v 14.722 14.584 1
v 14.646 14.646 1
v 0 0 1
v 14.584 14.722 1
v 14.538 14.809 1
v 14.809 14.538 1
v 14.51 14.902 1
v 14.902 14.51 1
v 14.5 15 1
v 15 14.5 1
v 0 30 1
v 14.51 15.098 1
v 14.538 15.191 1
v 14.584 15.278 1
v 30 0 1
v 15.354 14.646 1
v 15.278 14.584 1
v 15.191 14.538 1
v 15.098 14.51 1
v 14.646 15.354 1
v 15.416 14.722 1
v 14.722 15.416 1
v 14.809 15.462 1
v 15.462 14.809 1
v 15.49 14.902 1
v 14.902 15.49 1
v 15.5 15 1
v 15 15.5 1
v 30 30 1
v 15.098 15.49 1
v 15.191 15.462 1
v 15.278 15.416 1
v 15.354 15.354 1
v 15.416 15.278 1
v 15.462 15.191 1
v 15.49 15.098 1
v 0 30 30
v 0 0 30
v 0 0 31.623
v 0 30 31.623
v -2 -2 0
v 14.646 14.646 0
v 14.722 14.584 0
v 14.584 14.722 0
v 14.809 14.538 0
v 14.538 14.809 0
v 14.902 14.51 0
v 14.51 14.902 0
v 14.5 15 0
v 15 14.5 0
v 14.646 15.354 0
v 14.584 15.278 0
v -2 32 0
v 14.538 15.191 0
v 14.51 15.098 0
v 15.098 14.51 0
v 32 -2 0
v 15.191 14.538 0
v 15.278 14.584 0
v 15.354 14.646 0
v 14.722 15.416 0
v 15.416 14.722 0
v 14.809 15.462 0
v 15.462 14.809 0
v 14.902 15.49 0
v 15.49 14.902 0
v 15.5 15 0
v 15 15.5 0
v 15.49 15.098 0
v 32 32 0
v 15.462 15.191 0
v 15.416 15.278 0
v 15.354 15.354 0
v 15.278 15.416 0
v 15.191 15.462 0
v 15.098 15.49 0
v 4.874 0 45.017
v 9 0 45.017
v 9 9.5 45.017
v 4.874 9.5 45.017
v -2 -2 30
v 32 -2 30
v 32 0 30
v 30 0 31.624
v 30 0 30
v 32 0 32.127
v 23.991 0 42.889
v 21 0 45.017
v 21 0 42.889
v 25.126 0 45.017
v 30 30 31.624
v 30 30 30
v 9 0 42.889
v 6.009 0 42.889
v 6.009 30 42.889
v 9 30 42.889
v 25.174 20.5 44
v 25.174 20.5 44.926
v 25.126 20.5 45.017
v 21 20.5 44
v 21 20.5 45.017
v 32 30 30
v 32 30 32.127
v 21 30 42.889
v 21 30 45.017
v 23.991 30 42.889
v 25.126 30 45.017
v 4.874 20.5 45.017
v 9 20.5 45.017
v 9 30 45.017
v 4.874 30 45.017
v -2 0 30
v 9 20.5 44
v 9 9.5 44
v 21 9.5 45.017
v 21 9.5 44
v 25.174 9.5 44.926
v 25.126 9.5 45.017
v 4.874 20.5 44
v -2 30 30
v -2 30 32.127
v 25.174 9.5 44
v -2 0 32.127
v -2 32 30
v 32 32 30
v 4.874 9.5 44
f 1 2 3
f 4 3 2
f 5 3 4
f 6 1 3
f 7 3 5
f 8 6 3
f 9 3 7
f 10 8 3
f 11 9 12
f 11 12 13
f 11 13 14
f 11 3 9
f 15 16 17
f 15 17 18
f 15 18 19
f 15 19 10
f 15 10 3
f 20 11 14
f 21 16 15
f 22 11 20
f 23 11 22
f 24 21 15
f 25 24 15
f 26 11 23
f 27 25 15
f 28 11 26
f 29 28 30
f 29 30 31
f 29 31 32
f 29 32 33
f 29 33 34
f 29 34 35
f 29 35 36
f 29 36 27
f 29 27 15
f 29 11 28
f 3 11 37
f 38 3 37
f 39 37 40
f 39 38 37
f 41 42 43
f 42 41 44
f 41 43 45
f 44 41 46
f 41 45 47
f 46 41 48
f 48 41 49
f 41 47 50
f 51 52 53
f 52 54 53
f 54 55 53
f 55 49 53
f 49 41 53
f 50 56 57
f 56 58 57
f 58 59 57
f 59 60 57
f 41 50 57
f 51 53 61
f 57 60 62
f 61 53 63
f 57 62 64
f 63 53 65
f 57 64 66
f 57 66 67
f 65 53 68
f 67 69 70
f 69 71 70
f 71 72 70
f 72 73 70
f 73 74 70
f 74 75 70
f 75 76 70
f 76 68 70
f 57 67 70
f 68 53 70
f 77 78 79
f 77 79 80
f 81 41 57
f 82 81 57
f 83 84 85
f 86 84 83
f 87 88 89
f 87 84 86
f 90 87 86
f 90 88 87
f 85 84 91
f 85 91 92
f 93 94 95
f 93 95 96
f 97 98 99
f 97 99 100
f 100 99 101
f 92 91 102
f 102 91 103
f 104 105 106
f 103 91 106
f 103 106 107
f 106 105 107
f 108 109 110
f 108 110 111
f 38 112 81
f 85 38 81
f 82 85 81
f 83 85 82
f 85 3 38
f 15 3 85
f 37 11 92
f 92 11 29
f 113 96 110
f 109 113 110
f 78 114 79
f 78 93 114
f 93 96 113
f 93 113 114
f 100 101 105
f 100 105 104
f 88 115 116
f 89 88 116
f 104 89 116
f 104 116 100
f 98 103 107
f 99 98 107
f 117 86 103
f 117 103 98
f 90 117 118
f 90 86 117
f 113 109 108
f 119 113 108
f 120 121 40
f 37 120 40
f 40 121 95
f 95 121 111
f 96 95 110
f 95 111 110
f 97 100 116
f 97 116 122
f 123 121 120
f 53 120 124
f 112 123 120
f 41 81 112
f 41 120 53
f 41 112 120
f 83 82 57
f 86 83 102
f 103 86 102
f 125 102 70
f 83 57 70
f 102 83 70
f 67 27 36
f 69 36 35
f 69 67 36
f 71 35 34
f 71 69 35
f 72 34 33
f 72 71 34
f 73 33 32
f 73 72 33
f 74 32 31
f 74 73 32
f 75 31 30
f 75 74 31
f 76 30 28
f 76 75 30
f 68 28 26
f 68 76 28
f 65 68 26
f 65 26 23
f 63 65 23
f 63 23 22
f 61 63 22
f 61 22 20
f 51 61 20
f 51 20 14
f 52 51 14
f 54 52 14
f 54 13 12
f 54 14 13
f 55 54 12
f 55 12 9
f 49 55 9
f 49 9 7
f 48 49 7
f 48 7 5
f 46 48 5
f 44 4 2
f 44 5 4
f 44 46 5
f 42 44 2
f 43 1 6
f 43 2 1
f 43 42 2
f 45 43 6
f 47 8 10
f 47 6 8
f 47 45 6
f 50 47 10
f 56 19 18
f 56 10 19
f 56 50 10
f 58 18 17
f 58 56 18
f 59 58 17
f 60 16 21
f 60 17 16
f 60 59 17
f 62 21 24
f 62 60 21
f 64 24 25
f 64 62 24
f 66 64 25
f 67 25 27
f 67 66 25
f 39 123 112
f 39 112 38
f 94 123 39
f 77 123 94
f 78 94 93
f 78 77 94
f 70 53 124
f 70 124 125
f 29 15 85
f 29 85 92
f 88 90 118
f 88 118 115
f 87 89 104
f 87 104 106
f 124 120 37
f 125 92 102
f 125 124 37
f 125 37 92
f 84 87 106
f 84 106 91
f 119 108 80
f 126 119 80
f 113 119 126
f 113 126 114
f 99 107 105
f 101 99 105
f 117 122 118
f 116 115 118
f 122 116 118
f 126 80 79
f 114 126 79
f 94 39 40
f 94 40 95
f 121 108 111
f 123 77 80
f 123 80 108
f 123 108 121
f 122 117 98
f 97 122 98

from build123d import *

# Parameters (mm, degrees)
F0_W      = 34
F0_H      = 34
F0_W_2    = 30
F0_H_2    = 30
F1_DEPTH  = 30
F2_W      = 32.414368
F2_H      = 32.092232
F3_DEPTH  = 1
F4_R      = 0.5
F5_DEPTH  = 2
F7_DEPTH  = 30
F10_DEPTH = 2


with BuildPart() as f1:
    # F0 (on Top) → F1 (new body)
    with BuildSketch(Plane.XY):
        with Locations((15, 15)):
            Rectangle(F0_W, F0_H)
        with Locations((15, 15)):
            Rectangle(F0_W_2, F0_H_2, mode=Mode.SUBTRACT)
    extrude(amount=F1_DEPTH)

    # F2 (on Top) → F3 (join)
    with BuildSketch(Plane.XY):
        with Locations((15.036923, 14.937822)):
            Rectangle(F2_W, F2_H)
    extrude(amount=F3_DEPTH)

    # F4 (on Top) → F5 (cut)
    with BuildSketch(Plane.XY):
        with Locations((15, 15)):
            Circle(F4_R)
    extrude(amount=F5_DEPTH, mode=Mode.SUBTRACT)

    # F6 (on Front) → F7 (join)
    with BuildSketch(Plane.XZ):
        Polygon((-2, 32.127354), (-2, 30), (-0.865411, 30), (0, 30), (0, 31.622646), (6.008863, 42.889264), (7.5, 42.889264), (9, 42.889264), (9, 45.016619), (7.5, 45.016619), (6.008863, 45.016619), (4.874274, 45.016619), align=None)
        Polygon((32, 32.127354), (25.125726, 45.016619), (23.991137, 45.016619), (22.5, 45.016619), (21, 45.016619), (21, 42.889264), (22.5, 42.889264), (23.991137, 42.889264), (29.999532, 31.623524), (29.999532, 30), (30.865411, 30), (32, 30), align=None)
    extrude(amount=-F7_DEPTH)

    # F9 (on offset) → F10 (cut)
    with BuildSketch(Plane.XY.offset(46)):
        Polygon((25.174274, 20.5), (4.874274, 20.5), (4.874274, 15), (4.874274, 9.5), (25.174274, 9.5), align=None)
    extrude(amount=-F10_DEPTH, mode=Mode.SUBTRACT)


solid = f1.part
